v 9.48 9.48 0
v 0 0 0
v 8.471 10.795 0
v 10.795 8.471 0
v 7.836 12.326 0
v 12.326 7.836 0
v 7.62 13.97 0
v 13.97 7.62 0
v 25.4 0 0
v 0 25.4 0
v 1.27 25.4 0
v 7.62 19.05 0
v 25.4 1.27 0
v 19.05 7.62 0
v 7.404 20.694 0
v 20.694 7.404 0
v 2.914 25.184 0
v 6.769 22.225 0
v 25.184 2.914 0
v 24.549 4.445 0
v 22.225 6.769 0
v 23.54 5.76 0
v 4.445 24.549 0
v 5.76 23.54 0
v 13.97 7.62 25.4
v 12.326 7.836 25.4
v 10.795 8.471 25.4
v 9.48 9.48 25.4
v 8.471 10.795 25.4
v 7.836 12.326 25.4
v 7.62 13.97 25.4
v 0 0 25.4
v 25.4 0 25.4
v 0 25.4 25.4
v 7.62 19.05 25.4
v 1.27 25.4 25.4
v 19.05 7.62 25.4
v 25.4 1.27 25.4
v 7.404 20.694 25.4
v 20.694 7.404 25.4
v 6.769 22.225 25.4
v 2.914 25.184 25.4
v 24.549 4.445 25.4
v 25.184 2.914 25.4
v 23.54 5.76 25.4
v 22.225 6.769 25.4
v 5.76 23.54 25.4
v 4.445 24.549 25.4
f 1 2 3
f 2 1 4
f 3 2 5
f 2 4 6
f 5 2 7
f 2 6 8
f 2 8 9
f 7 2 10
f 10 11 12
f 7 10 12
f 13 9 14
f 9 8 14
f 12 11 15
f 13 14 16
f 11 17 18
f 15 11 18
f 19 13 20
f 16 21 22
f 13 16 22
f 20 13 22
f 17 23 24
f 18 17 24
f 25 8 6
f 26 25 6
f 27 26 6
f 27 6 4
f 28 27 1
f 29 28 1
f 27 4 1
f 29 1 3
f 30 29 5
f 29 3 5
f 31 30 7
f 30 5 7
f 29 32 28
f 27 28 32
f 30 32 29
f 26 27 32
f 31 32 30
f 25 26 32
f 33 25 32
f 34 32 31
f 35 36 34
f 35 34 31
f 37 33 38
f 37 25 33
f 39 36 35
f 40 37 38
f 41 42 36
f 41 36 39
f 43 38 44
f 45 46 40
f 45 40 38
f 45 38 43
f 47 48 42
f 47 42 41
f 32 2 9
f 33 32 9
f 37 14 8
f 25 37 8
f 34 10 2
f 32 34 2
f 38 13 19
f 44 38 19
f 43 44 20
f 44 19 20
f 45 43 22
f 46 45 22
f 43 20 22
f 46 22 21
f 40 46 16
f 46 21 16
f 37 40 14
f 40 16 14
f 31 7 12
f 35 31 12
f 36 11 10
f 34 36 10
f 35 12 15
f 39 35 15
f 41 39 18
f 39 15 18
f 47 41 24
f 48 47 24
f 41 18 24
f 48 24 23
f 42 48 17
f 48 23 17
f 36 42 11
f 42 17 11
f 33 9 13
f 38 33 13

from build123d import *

# Parameters (mm, degrees)
F1_DEPTH = 25.4


with BuildPart() as f1:
    # F0 (on Top) → F1 (new body)
    with BuildSketch(Plane.XY):
        with BuildLine():
            Line((1.27, 25.4), (0, 25.4))
            Line((0, 25.4), (0, 0))
            Line((0, 0), (25.4, 0))
            Line((25.4, 0), (25.4, 1.27))
            ThreePointArc((25.4, 1.27), (23.540128, 5.760128), (19.05, 7.62))
            Line((19.05, 7.62), (13.97, 7.62))
            ThreePointArc((13.97, 7.62), (9.479872, 9.479872), (7.62, 13.97))
            Line((7.62, 13.97), (7.62, 19.05))
            ThreePointArc((7.62, 19.05), (5.760128, 23.540128), (1.27, 25.4))
        make_face()
    extrude(amount=F1_DEPTH)


solid = f1.part
